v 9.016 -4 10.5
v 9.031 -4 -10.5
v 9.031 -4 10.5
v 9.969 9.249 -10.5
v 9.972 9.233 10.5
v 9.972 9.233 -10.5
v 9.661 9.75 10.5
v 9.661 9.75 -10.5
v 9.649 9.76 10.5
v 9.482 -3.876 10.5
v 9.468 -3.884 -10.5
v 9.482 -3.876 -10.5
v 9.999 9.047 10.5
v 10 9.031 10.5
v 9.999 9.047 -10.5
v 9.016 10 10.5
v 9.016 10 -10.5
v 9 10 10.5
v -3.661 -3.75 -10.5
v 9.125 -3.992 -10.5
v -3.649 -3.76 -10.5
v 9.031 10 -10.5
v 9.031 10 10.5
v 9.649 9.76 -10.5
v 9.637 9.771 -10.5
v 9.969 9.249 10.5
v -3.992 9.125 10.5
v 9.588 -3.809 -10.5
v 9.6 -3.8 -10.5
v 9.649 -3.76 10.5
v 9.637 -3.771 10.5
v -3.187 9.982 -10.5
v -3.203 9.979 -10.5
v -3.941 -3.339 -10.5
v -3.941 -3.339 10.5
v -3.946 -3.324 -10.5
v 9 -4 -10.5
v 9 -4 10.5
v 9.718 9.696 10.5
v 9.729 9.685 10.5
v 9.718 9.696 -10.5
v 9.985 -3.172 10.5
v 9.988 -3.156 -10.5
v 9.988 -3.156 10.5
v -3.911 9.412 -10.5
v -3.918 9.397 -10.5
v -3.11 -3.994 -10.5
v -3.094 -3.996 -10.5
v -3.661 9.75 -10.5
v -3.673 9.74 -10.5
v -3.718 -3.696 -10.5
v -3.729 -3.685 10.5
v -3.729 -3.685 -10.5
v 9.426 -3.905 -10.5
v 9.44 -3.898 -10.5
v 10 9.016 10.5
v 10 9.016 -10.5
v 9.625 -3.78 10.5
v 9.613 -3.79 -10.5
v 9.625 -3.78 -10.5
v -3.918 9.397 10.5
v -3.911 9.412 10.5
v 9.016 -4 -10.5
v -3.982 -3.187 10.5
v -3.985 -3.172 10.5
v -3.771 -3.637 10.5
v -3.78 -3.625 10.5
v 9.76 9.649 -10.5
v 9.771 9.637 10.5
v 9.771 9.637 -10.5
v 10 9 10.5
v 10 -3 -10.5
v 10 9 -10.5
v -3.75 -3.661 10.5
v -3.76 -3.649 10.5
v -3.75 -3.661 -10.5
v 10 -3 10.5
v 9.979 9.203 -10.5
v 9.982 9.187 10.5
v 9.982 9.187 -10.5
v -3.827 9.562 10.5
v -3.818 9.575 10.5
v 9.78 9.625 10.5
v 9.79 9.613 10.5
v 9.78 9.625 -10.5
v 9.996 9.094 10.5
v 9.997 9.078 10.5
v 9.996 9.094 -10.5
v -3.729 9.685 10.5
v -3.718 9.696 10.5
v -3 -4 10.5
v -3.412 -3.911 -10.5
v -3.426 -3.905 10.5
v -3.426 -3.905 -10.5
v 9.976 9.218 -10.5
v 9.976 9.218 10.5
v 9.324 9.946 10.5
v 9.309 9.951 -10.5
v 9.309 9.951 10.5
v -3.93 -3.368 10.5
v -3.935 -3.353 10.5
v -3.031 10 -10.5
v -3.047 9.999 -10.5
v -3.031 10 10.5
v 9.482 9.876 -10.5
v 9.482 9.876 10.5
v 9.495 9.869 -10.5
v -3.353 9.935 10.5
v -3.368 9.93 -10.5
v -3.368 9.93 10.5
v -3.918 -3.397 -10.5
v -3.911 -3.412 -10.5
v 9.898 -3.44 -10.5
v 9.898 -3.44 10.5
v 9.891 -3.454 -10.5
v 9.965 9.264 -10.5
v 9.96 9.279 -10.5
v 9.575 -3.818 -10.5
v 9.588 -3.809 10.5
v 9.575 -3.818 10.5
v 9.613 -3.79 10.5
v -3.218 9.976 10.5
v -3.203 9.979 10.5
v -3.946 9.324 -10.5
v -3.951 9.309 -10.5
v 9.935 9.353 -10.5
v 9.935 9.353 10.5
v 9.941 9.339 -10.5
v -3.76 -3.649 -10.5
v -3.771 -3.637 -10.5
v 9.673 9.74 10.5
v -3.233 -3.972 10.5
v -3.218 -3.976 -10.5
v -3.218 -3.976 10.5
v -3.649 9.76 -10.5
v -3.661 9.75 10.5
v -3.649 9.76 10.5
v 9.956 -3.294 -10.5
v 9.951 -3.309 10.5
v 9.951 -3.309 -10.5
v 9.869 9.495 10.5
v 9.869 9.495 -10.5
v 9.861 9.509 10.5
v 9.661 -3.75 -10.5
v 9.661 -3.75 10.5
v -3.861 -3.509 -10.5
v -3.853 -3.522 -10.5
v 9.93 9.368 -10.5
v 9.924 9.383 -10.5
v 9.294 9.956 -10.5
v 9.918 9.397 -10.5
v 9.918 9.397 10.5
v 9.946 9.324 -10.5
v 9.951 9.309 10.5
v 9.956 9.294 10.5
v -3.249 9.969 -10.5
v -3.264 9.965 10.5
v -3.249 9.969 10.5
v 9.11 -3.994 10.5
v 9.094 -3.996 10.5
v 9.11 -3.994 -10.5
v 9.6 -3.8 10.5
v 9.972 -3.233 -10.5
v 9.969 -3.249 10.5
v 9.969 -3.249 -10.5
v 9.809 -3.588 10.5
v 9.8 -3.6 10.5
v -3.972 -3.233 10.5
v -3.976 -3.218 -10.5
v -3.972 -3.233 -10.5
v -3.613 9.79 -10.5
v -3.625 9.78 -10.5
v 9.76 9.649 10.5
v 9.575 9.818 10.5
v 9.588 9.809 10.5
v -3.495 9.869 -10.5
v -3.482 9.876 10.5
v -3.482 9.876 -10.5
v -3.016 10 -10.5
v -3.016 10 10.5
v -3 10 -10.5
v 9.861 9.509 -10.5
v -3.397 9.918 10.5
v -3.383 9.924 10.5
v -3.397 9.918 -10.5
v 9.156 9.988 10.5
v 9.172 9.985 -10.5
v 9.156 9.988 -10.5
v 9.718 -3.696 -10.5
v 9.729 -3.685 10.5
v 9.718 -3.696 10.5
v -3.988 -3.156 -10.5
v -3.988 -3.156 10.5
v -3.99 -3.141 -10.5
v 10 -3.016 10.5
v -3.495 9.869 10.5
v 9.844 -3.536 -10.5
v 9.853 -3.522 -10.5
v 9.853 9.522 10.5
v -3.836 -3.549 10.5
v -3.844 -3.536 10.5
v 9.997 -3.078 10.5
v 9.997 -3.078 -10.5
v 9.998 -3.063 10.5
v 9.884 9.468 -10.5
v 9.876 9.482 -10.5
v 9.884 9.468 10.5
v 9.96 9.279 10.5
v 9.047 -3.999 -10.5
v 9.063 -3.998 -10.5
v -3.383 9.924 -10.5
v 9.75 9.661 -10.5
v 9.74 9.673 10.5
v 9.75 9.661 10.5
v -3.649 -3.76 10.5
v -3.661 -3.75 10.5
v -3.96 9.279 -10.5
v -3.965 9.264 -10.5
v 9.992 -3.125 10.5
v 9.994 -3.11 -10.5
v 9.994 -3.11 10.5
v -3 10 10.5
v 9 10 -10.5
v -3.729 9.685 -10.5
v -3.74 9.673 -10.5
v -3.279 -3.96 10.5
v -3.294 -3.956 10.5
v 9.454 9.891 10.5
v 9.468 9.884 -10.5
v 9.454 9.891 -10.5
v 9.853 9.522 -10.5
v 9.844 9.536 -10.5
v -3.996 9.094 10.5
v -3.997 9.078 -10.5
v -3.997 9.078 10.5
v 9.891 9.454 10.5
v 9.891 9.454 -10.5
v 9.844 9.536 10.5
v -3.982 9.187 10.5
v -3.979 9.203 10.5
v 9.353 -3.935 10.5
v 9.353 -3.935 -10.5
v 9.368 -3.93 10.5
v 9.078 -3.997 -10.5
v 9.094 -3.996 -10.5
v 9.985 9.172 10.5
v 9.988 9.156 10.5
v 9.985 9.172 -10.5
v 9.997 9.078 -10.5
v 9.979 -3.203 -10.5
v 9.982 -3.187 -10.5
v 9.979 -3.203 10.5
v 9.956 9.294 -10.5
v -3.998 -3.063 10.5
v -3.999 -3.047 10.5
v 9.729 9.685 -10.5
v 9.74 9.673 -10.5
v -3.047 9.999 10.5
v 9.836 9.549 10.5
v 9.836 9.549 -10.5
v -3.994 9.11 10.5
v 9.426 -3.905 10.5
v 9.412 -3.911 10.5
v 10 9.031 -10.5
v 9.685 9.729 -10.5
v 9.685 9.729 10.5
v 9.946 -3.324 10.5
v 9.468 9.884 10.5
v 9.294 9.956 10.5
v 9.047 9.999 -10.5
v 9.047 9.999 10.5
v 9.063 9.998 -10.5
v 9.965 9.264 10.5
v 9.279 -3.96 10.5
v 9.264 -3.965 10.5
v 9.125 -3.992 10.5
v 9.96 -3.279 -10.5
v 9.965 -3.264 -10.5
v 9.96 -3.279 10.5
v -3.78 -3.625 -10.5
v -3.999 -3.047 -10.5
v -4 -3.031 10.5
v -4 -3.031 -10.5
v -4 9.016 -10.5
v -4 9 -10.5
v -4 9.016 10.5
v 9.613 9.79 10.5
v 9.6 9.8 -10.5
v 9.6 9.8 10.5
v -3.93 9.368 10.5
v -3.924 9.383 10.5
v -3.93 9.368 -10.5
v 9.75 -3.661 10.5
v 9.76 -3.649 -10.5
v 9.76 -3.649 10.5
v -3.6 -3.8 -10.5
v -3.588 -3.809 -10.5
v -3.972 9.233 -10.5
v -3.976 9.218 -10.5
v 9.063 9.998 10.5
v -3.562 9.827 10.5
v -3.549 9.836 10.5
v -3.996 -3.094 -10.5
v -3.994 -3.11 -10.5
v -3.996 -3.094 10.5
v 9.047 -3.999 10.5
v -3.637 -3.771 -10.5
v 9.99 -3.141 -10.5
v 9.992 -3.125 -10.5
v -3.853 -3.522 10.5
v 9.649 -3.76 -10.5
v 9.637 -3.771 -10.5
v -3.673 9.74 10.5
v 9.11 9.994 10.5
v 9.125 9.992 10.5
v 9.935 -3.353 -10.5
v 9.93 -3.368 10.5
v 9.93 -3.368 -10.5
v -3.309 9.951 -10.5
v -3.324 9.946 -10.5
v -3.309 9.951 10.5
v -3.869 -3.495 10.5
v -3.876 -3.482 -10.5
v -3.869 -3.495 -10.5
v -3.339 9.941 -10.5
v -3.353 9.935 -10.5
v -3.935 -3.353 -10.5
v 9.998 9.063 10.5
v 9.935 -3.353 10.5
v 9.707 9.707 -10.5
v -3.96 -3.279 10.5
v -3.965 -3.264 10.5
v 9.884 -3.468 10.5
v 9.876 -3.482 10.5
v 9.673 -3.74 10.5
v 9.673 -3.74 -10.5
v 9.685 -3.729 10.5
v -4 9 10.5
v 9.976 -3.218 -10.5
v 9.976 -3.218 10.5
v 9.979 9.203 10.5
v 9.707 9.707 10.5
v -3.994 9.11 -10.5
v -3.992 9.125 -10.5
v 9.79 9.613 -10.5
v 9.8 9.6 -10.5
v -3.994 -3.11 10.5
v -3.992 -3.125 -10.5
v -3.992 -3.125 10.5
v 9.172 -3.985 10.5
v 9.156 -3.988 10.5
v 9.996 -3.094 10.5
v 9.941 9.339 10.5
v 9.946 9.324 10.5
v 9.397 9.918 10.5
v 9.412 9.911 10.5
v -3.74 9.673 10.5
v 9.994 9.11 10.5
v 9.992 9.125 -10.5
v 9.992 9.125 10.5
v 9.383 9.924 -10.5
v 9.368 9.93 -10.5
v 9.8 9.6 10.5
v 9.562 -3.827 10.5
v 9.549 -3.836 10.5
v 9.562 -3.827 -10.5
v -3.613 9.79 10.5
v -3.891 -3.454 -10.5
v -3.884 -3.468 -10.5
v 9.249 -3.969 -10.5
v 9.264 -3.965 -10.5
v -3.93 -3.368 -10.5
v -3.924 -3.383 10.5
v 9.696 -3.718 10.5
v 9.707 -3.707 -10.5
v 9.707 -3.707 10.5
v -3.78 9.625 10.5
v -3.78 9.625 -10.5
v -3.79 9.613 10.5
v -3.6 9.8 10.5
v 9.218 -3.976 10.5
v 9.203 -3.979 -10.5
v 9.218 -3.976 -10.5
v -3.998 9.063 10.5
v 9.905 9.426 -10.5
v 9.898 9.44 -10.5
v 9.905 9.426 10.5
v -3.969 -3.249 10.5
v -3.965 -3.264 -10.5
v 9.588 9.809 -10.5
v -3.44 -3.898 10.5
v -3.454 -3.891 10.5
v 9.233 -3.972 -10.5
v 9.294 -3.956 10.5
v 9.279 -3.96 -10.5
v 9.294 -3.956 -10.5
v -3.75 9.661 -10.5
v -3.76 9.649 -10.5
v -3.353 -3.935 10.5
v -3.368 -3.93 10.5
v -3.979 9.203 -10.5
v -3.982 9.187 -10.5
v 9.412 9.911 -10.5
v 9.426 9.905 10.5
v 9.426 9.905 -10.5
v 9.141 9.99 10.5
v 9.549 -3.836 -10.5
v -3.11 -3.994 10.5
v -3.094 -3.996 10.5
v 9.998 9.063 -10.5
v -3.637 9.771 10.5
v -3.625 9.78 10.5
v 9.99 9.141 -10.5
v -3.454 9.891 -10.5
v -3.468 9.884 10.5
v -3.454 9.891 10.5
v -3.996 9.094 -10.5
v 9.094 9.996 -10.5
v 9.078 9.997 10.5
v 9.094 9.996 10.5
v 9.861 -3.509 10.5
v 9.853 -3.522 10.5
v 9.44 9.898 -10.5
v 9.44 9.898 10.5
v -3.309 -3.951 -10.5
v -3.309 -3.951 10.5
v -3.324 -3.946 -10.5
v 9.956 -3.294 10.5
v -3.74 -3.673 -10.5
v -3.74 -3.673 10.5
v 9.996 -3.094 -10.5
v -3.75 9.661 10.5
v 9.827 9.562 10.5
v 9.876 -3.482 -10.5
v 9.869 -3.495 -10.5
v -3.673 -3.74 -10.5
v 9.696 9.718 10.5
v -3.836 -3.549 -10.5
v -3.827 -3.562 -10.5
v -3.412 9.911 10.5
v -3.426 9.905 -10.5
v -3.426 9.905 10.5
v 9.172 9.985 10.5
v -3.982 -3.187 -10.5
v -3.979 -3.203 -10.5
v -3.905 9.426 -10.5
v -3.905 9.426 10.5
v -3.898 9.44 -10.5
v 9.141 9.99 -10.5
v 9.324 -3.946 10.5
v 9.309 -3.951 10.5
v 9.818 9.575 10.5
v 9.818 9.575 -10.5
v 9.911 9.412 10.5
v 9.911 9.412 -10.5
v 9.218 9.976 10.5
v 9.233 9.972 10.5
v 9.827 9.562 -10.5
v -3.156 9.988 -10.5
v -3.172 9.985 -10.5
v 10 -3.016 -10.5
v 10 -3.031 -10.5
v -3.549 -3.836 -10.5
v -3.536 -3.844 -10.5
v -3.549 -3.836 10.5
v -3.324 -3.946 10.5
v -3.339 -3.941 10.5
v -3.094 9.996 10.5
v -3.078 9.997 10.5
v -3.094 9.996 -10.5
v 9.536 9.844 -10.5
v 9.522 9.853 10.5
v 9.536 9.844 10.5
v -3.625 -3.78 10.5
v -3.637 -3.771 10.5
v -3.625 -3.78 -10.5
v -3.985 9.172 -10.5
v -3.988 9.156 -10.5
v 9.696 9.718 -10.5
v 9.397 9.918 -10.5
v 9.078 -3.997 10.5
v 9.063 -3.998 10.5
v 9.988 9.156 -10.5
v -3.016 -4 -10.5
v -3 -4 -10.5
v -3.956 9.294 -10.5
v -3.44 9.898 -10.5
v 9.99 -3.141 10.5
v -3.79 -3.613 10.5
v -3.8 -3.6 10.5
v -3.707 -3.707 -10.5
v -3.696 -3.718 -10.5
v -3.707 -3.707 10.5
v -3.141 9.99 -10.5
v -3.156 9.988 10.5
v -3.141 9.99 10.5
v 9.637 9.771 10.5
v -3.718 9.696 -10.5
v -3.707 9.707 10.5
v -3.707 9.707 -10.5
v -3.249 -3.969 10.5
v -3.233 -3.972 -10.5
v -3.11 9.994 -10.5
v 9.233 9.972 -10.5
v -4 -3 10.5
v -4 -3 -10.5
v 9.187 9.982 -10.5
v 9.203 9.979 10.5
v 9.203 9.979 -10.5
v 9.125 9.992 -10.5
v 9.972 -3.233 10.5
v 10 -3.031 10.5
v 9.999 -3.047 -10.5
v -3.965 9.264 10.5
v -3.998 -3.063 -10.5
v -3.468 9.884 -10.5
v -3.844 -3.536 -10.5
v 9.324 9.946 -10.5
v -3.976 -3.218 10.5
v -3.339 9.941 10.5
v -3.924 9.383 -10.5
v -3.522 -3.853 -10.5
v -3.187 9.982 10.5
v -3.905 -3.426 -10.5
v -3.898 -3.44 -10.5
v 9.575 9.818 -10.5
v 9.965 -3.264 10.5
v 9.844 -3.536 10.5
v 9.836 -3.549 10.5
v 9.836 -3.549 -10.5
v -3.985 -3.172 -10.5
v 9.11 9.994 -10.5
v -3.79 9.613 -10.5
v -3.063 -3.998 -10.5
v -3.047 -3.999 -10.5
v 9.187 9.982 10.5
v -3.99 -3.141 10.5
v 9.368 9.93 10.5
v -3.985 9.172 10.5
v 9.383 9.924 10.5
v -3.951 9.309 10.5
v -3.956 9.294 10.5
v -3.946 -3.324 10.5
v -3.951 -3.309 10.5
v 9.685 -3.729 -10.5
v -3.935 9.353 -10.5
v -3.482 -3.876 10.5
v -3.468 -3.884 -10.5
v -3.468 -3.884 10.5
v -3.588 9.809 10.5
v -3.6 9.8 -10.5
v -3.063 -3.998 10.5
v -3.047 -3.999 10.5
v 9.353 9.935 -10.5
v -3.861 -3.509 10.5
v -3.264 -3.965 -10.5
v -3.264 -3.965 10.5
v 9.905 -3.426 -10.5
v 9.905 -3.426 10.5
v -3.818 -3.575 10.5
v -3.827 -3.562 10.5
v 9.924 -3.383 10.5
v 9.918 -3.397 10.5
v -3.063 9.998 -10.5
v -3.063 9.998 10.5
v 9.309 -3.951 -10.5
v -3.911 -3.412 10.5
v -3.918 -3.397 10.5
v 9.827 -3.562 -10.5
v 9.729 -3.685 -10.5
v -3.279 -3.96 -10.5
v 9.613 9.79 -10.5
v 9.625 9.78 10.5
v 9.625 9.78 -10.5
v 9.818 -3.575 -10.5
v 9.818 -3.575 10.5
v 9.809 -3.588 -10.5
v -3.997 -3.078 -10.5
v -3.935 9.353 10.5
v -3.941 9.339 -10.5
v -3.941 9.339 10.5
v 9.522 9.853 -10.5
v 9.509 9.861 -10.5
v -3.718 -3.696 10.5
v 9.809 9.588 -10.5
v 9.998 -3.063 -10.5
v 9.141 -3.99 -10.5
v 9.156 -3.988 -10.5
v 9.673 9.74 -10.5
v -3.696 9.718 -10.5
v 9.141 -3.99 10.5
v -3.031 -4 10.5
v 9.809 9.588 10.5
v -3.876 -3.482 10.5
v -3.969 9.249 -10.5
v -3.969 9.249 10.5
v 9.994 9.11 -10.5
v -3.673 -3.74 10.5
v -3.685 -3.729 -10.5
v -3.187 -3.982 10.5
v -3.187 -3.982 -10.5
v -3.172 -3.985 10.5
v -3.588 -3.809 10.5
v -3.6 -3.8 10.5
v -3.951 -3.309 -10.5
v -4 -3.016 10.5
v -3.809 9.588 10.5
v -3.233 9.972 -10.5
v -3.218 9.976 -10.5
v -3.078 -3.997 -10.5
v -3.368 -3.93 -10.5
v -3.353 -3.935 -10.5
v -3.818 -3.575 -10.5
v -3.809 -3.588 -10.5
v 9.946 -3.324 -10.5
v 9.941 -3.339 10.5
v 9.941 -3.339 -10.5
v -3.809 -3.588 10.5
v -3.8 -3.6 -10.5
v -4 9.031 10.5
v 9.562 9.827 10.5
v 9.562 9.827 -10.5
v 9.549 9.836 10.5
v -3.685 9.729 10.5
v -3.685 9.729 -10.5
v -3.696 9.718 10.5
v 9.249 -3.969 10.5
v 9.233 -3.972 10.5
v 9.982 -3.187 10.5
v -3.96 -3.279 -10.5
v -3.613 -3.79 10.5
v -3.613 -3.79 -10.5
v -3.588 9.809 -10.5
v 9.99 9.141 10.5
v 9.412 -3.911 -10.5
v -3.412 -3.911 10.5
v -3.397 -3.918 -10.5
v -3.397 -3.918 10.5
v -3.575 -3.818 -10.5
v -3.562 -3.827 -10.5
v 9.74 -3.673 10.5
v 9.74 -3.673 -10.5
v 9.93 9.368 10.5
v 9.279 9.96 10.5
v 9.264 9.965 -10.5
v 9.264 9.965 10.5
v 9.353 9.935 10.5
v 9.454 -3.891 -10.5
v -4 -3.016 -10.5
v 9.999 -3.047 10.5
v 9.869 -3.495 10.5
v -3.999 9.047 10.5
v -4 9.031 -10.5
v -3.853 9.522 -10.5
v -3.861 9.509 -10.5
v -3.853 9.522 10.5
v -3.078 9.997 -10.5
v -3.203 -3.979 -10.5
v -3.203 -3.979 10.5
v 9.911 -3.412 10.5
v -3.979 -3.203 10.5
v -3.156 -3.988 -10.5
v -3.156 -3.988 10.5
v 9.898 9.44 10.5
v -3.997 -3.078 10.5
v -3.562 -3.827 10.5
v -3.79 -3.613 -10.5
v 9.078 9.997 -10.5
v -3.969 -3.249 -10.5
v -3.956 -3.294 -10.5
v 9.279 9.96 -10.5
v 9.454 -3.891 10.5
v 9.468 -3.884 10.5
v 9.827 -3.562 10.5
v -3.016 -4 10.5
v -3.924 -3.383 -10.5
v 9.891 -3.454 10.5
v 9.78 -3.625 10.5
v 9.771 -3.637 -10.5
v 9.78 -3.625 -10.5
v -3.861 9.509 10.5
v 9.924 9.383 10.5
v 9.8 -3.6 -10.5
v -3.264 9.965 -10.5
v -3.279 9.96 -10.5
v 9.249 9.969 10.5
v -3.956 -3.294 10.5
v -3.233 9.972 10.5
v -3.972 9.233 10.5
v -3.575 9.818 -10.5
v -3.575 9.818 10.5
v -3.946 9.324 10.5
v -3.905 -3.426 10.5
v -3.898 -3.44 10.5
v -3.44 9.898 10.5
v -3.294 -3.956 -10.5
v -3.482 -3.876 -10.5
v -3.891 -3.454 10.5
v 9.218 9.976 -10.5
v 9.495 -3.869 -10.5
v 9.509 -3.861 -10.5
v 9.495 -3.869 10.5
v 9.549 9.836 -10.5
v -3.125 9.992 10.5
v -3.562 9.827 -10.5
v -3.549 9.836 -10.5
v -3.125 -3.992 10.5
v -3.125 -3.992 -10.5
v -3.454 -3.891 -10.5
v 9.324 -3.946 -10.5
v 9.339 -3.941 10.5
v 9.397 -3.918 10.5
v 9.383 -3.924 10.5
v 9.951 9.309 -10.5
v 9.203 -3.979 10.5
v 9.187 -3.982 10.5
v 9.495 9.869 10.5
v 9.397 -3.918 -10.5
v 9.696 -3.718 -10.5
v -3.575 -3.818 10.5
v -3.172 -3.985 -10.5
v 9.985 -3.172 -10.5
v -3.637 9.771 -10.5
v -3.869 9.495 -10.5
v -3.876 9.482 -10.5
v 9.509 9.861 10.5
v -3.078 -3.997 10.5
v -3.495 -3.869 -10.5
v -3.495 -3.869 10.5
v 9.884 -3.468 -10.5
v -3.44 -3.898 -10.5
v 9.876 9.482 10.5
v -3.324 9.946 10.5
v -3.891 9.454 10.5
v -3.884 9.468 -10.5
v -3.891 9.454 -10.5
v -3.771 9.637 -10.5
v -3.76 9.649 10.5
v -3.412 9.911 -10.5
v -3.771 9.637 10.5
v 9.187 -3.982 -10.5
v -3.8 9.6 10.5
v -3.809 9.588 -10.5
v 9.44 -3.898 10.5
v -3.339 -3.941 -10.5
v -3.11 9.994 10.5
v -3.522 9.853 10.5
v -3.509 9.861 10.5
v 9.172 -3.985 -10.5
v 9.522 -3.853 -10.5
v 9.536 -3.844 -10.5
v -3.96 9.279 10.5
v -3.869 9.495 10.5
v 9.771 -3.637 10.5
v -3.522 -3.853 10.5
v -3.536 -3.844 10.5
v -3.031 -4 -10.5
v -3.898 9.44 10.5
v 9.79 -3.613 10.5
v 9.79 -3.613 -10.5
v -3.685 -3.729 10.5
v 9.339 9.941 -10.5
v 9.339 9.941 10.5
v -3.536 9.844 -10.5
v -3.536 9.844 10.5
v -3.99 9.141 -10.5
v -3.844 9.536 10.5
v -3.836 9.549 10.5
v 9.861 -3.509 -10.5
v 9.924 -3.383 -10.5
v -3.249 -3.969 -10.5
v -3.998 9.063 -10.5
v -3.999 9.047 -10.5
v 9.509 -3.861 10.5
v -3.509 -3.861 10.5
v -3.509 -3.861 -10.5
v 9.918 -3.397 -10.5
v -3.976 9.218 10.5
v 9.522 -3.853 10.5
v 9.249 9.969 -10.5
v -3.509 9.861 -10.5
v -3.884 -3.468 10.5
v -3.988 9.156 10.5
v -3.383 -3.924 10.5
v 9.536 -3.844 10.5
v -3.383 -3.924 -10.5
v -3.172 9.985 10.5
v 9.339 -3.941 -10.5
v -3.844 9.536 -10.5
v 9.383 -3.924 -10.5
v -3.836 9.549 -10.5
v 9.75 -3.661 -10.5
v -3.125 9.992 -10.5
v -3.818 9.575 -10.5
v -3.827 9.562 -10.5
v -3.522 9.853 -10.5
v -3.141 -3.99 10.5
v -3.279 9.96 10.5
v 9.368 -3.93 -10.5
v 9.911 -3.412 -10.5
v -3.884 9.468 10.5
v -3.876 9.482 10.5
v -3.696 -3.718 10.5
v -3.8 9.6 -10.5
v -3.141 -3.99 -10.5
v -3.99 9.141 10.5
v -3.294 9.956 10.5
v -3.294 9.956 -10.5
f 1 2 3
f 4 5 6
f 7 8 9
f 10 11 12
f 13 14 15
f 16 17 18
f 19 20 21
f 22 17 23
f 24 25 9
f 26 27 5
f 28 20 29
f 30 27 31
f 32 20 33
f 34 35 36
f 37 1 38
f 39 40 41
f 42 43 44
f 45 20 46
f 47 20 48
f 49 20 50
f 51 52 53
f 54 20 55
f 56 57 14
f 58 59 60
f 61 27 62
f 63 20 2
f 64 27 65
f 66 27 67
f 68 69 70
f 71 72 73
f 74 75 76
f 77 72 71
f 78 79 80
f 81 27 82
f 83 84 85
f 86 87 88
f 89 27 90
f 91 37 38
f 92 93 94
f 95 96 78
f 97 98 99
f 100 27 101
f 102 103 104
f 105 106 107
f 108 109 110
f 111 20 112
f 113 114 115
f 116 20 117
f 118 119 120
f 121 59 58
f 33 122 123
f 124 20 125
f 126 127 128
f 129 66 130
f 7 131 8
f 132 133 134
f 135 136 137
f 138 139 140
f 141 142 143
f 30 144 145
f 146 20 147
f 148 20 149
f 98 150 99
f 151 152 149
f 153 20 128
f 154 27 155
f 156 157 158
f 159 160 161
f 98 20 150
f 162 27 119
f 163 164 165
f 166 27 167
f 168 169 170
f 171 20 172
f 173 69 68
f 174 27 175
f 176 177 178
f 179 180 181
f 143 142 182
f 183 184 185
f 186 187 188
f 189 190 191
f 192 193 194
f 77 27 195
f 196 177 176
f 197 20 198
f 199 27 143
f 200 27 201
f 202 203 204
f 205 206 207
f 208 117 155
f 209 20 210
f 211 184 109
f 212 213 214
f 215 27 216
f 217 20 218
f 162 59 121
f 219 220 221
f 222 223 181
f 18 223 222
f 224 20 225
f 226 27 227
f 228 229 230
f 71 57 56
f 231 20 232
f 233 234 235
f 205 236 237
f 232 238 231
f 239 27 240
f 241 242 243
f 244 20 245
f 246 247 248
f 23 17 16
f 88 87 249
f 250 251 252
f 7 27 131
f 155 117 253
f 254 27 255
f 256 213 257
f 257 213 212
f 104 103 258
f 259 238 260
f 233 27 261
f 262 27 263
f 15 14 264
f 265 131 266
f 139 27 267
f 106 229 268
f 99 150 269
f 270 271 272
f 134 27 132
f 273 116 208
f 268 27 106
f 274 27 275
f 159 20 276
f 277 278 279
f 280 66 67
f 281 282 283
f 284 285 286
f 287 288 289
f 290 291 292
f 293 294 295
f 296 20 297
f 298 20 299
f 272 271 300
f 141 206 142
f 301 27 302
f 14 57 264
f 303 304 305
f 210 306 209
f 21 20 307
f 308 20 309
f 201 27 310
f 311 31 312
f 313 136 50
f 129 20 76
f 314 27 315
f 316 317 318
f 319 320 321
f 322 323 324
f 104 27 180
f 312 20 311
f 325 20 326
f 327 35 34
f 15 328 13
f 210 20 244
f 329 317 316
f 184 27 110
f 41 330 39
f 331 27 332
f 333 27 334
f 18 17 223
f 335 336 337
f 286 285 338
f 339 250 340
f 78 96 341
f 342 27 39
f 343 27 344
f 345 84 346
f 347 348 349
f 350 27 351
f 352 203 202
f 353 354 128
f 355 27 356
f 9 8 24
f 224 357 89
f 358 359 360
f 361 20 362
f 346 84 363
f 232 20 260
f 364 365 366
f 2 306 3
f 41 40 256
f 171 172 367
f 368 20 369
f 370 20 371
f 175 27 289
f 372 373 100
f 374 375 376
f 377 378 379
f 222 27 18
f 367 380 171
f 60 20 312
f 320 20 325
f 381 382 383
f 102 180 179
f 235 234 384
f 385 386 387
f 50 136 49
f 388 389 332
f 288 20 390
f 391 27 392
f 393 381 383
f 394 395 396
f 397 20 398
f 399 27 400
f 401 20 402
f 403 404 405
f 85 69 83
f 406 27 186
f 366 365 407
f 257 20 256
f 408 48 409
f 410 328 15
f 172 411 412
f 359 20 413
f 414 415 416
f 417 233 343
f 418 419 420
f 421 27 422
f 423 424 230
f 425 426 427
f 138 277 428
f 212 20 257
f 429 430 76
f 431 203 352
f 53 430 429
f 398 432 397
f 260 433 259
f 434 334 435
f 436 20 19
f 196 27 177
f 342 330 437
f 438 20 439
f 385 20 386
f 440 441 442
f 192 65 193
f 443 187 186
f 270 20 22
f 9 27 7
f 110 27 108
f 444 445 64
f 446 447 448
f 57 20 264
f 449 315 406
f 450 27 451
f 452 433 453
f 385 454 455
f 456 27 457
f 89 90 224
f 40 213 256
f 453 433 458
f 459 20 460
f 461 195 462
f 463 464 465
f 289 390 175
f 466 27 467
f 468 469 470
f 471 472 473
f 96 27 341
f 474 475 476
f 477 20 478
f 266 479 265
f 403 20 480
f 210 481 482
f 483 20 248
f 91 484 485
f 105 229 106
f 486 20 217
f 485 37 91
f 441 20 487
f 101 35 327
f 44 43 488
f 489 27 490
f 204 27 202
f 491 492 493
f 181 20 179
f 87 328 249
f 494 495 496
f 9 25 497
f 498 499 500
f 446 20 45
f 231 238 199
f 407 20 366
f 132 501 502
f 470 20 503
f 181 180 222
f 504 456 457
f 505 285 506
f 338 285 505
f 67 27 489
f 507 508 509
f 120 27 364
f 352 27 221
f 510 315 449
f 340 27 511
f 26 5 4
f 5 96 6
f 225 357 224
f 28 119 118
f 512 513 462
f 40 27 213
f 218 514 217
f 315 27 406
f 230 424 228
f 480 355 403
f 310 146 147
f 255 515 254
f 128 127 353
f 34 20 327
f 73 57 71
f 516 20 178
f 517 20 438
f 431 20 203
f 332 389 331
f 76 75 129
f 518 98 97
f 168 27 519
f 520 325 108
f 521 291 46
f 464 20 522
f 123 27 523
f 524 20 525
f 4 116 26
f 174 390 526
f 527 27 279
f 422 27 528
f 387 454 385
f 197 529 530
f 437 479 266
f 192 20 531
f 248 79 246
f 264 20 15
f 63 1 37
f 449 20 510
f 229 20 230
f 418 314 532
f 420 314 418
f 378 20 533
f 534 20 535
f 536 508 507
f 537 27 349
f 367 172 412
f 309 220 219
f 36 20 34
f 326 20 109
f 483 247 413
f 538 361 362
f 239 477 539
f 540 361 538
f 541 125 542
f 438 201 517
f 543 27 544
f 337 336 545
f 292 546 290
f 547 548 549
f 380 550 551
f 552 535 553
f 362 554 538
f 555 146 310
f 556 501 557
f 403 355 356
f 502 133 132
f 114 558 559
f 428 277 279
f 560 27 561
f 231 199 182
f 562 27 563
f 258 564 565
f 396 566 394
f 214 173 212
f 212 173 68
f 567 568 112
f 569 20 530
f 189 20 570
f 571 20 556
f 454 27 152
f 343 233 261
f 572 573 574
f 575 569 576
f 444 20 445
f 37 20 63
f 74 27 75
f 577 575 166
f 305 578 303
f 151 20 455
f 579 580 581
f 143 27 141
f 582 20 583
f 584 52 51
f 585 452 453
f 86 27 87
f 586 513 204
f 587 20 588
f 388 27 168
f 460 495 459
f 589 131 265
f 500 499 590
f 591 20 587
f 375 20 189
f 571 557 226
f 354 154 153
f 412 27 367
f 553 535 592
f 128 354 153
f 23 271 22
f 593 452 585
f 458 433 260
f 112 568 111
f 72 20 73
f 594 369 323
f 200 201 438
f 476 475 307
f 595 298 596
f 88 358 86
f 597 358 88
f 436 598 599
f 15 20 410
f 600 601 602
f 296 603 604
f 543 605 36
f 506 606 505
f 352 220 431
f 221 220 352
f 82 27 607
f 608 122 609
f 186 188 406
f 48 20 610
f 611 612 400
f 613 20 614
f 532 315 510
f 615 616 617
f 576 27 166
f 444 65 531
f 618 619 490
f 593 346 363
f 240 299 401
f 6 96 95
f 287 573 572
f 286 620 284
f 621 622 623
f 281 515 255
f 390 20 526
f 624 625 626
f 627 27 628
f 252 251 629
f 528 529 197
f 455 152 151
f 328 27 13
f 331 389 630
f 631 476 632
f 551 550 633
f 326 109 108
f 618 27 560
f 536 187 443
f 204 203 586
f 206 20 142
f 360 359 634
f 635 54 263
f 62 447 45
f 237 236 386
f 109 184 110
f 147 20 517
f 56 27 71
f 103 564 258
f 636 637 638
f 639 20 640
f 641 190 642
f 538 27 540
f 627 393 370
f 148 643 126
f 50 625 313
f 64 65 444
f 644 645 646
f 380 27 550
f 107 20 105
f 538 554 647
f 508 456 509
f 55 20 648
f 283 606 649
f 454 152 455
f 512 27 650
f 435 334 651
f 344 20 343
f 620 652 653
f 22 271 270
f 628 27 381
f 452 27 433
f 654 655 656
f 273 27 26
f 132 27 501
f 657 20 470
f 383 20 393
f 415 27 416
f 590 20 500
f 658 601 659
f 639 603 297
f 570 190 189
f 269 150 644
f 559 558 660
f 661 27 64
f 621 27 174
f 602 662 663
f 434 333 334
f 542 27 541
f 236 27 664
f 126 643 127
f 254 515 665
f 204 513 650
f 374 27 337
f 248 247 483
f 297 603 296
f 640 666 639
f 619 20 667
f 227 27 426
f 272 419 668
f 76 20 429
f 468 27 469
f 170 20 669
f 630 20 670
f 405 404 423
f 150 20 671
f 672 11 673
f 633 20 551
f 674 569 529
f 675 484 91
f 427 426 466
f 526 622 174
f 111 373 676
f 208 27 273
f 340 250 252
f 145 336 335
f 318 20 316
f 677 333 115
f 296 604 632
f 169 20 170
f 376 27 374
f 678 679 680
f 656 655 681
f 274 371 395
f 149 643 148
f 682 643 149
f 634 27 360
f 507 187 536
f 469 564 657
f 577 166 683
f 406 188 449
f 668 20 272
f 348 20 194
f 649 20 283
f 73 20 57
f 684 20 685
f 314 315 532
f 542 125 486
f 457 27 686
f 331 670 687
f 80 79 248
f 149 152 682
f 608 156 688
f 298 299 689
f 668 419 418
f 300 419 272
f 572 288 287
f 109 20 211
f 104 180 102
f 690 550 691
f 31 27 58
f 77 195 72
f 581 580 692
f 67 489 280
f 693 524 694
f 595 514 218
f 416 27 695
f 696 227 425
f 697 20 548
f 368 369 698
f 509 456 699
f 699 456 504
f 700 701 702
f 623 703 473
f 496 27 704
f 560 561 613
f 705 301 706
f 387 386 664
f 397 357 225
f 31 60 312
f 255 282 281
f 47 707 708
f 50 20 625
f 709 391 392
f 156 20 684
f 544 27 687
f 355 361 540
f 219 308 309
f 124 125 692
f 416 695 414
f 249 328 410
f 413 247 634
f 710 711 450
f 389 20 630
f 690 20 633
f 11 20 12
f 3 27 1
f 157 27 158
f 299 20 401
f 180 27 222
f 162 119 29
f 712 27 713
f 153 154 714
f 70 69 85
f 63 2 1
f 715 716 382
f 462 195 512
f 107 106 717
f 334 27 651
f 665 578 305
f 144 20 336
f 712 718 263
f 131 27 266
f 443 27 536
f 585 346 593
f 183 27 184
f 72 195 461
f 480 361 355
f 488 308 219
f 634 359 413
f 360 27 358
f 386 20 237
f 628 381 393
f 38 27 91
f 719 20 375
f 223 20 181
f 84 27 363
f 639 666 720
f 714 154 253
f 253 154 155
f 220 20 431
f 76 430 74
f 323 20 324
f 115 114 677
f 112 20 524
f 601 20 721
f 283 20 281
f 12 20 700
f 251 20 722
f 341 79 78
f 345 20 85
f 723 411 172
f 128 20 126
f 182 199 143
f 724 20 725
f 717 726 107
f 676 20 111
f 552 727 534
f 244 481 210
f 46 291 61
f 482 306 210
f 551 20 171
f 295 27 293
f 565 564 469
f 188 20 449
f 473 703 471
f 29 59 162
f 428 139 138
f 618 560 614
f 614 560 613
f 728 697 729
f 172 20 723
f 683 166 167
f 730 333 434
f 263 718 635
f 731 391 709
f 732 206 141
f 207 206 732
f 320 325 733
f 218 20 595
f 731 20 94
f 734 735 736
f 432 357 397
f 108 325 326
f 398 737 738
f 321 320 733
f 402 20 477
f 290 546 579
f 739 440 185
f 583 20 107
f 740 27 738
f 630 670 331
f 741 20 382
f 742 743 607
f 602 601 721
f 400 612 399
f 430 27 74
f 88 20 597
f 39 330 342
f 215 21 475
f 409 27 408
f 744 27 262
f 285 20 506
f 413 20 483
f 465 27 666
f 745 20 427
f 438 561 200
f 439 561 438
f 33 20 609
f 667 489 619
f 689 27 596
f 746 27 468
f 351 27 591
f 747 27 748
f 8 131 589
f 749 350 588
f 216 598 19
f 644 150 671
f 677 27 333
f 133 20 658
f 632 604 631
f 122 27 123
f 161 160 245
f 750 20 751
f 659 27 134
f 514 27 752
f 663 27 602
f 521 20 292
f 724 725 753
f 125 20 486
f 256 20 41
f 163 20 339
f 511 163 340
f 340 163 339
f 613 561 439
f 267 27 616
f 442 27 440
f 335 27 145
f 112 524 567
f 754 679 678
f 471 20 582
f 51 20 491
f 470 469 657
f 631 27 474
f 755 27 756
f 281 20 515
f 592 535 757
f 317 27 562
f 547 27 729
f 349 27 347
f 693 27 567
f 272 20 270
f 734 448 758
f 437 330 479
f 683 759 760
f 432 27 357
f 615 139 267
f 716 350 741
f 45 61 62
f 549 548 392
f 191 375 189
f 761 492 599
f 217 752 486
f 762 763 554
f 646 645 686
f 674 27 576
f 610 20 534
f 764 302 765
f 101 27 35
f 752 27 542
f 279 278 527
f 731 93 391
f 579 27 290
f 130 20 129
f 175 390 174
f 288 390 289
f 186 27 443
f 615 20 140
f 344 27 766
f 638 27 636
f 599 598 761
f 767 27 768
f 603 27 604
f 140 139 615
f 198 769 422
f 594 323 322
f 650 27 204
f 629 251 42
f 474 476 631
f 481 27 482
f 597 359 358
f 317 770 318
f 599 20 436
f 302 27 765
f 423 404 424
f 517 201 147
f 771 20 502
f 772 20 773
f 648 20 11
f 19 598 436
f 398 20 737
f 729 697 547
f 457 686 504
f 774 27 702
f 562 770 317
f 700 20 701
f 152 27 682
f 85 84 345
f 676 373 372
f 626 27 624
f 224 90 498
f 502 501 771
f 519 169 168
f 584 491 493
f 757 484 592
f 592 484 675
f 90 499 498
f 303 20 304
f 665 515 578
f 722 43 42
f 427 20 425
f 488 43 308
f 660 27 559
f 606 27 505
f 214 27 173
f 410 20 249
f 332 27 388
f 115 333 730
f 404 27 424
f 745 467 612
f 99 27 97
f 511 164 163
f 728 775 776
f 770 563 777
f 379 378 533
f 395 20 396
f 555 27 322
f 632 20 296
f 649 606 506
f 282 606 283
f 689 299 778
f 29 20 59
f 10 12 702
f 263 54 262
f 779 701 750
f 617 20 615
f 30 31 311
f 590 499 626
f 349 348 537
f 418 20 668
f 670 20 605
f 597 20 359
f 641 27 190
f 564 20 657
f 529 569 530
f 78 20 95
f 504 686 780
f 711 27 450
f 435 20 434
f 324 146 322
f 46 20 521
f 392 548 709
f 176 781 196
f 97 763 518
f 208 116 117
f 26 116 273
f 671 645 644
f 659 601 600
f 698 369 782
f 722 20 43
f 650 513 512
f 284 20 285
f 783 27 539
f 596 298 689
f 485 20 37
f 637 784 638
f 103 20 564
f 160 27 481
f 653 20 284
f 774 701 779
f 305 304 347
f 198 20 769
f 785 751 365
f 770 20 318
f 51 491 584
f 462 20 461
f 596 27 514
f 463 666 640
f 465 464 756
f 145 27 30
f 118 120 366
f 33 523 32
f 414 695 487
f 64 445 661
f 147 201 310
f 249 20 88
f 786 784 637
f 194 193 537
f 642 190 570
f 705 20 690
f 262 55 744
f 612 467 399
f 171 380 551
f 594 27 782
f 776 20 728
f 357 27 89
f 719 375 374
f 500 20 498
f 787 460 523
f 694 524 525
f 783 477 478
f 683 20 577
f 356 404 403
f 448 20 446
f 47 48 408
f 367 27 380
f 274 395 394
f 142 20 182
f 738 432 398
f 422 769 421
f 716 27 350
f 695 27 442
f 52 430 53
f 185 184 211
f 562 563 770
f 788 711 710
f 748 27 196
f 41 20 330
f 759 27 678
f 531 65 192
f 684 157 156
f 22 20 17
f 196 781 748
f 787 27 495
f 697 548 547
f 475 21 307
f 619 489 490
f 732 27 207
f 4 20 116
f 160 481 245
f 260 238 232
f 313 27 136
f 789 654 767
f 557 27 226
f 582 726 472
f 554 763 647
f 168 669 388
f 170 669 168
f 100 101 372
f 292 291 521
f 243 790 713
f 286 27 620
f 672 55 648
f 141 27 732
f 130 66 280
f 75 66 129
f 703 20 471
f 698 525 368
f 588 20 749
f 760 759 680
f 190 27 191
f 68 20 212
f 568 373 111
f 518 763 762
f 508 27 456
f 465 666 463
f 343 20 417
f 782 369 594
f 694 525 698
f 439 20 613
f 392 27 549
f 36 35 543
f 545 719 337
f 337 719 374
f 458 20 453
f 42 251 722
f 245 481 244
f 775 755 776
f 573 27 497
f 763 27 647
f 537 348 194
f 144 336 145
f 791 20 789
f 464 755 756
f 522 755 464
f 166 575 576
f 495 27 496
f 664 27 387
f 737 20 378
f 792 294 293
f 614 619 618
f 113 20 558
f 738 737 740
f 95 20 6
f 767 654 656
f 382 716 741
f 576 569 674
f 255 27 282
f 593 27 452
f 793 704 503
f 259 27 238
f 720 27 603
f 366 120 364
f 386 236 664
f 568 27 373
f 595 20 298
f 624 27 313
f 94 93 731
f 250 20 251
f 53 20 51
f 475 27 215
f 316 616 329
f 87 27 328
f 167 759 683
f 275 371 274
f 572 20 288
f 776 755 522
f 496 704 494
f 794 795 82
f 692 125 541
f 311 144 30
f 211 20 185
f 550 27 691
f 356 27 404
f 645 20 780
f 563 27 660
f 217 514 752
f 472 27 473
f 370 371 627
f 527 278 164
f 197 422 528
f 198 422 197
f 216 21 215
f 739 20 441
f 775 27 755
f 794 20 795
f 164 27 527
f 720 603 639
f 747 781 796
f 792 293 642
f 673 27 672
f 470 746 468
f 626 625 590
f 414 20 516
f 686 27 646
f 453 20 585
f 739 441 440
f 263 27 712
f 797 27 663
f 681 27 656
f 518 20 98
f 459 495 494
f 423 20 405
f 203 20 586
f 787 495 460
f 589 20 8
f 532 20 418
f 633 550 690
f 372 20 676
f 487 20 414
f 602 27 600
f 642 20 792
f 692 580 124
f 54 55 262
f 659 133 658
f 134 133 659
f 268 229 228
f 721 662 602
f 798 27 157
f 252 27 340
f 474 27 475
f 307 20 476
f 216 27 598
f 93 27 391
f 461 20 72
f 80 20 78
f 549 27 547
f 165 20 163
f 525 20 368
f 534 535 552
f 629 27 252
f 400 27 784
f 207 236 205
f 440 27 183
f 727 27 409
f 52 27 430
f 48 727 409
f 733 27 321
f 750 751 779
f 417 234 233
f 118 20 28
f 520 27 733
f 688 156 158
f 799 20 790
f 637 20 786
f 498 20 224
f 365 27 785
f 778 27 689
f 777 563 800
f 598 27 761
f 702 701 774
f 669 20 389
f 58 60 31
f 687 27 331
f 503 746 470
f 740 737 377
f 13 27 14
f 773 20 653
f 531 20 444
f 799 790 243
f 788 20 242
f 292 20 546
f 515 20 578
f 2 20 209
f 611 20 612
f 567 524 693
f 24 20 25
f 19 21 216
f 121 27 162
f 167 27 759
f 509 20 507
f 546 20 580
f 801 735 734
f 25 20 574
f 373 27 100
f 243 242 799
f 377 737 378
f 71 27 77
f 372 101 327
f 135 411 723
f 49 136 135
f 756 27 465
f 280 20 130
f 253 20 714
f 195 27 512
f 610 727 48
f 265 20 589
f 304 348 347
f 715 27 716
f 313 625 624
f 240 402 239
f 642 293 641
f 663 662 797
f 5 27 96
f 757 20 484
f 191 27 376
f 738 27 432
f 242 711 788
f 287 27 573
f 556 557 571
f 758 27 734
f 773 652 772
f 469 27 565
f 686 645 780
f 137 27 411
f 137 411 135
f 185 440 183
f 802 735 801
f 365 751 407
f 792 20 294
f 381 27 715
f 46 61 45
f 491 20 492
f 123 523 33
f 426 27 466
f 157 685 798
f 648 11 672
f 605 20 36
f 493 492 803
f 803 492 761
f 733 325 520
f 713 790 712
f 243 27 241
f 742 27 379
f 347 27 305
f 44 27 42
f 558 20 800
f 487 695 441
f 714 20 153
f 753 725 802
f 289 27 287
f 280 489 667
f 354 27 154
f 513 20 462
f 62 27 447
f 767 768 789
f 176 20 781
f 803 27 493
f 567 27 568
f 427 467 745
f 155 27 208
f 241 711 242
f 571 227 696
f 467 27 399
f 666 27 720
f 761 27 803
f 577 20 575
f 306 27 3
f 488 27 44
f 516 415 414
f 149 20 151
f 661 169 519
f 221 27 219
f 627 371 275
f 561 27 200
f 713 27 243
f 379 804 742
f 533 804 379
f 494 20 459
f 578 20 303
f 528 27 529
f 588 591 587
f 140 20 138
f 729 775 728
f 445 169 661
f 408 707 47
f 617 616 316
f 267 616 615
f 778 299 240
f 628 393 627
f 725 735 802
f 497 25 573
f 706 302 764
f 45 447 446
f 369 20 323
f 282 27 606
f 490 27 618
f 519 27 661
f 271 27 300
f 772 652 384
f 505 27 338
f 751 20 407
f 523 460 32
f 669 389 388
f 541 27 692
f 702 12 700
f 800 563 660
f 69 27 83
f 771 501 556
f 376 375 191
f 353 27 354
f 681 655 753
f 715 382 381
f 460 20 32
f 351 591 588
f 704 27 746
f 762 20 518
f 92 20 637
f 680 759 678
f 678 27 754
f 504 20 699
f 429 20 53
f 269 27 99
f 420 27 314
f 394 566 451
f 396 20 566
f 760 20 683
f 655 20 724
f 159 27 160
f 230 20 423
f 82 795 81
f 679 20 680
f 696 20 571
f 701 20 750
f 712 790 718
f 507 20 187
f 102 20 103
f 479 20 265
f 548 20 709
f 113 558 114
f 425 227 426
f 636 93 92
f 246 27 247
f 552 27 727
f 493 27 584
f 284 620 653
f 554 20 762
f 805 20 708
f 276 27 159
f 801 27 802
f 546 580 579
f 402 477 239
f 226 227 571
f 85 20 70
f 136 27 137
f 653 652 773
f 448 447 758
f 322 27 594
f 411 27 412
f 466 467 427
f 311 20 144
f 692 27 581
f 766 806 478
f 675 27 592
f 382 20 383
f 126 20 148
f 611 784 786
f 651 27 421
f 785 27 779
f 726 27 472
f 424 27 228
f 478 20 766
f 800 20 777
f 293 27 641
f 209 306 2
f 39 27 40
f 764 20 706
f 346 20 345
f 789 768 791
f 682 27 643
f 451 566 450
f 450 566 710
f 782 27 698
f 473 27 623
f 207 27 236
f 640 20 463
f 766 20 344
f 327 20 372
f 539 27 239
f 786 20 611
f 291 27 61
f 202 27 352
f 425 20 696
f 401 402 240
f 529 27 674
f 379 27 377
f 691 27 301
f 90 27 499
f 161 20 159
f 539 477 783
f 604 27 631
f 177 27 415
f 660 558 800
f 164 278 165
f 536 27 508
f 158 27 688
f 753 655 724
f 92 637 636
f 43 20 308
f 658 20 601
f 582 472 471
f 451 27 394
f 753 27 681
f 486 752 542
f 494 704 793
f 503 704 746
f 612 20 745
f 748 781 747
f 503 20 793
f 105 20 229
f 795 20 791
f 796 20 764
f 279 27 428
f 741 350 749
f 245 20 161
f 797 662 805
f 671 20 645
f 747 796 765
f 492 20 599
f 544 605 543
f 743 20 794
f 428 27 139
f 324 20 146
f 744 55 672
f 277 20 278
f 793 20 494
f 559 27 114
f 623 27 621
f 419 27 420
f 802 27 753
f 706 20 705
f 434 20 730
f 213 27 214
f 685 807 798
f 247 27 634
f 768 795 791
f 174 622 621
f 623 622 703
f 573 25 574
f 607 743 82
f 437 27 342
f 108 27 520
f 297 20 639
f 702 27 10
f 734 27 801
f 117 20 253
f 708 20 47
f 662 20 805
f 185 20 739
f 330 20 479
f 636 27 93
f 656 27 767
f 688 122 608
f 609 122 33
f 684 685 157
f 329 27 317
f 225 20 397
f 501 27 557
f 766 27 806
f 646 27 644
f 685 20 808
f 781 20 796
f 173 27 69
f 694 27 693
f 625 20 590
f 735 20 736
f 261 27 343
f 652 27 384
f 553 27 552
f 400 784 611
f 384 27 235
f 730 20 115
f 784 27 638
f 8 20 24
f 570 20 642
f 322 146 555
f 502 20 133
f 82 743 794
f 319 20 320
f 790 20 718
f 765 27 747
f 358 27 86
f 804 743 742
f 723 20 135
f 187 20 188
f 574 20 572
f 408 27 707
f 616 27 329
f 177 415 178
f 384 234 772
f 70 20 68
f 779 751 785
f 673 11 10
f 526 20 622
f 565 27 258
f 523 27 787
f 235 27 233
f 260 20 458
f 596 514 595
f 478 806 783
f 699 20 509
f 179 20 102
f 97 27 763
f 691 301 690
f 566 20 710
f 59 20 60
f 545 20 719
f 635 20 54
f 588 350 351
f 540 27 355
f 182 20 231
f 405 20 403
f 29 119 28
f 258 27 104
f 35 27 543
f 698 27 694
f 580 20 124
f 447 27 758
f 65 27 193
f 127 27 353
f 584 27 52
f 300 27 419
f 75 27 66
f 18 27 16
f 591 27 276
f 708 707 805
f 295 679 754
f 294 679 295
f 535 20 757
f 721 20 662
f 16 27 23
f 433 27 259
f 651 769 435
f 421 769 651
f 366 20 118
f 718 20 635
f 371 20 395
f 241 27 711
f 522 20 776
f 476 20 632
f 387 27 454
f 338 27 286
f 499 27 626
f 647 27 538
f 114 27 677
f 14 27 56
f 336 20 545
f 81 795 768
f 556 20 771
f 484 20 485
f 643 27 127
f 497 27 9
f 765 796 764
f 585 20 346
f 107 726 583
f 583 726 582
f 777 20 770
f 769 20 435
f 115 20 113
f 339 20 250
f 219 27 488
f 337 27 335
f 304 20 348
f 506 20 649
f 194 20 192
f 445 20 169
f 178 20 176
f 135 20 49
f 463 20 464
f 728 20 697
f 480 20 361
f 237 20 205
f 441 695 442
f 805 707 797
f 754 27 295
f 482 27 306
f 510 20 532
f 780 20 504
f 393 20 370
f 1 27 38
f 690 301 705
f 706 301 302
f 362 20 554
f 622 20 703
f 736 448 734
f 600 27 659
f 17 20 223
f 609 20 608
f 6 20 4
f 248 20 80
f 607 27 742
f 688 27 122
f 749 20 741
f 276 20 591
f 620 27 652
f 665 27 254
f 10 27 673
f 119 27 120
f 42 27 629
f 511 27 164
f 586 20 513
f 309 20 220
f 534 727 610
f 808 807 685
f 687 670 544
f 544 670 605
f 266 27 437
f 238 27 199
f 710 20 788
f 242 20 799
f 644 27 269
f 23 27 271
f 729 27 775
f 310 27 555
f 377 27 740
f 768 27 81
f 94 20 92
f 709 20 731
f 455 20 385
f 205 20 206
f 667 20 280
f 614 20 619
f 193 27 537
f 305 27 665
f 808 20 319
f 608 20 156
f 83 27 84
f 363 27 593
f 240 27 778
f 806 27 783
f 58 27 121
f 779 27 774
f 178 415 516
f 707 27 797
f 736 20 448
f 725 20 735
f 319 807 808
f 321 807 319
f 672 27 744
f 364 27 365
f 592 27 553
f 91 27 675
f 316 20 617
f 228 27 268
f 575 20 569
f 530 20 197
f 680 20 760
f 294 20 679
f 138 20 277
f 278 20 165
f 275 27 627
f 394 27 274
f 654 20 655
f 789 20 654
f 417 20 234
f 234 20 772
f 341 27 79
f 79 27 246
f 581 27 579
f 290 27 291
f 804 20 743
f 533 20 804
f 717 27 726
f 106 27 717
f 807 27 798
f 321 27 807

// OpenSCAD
minkowski(){
    translate([3,3,0])
    cylinder(11, r=1, $fn=400, center=true);
    
    cube([12,12, 10],center=true);
    }
